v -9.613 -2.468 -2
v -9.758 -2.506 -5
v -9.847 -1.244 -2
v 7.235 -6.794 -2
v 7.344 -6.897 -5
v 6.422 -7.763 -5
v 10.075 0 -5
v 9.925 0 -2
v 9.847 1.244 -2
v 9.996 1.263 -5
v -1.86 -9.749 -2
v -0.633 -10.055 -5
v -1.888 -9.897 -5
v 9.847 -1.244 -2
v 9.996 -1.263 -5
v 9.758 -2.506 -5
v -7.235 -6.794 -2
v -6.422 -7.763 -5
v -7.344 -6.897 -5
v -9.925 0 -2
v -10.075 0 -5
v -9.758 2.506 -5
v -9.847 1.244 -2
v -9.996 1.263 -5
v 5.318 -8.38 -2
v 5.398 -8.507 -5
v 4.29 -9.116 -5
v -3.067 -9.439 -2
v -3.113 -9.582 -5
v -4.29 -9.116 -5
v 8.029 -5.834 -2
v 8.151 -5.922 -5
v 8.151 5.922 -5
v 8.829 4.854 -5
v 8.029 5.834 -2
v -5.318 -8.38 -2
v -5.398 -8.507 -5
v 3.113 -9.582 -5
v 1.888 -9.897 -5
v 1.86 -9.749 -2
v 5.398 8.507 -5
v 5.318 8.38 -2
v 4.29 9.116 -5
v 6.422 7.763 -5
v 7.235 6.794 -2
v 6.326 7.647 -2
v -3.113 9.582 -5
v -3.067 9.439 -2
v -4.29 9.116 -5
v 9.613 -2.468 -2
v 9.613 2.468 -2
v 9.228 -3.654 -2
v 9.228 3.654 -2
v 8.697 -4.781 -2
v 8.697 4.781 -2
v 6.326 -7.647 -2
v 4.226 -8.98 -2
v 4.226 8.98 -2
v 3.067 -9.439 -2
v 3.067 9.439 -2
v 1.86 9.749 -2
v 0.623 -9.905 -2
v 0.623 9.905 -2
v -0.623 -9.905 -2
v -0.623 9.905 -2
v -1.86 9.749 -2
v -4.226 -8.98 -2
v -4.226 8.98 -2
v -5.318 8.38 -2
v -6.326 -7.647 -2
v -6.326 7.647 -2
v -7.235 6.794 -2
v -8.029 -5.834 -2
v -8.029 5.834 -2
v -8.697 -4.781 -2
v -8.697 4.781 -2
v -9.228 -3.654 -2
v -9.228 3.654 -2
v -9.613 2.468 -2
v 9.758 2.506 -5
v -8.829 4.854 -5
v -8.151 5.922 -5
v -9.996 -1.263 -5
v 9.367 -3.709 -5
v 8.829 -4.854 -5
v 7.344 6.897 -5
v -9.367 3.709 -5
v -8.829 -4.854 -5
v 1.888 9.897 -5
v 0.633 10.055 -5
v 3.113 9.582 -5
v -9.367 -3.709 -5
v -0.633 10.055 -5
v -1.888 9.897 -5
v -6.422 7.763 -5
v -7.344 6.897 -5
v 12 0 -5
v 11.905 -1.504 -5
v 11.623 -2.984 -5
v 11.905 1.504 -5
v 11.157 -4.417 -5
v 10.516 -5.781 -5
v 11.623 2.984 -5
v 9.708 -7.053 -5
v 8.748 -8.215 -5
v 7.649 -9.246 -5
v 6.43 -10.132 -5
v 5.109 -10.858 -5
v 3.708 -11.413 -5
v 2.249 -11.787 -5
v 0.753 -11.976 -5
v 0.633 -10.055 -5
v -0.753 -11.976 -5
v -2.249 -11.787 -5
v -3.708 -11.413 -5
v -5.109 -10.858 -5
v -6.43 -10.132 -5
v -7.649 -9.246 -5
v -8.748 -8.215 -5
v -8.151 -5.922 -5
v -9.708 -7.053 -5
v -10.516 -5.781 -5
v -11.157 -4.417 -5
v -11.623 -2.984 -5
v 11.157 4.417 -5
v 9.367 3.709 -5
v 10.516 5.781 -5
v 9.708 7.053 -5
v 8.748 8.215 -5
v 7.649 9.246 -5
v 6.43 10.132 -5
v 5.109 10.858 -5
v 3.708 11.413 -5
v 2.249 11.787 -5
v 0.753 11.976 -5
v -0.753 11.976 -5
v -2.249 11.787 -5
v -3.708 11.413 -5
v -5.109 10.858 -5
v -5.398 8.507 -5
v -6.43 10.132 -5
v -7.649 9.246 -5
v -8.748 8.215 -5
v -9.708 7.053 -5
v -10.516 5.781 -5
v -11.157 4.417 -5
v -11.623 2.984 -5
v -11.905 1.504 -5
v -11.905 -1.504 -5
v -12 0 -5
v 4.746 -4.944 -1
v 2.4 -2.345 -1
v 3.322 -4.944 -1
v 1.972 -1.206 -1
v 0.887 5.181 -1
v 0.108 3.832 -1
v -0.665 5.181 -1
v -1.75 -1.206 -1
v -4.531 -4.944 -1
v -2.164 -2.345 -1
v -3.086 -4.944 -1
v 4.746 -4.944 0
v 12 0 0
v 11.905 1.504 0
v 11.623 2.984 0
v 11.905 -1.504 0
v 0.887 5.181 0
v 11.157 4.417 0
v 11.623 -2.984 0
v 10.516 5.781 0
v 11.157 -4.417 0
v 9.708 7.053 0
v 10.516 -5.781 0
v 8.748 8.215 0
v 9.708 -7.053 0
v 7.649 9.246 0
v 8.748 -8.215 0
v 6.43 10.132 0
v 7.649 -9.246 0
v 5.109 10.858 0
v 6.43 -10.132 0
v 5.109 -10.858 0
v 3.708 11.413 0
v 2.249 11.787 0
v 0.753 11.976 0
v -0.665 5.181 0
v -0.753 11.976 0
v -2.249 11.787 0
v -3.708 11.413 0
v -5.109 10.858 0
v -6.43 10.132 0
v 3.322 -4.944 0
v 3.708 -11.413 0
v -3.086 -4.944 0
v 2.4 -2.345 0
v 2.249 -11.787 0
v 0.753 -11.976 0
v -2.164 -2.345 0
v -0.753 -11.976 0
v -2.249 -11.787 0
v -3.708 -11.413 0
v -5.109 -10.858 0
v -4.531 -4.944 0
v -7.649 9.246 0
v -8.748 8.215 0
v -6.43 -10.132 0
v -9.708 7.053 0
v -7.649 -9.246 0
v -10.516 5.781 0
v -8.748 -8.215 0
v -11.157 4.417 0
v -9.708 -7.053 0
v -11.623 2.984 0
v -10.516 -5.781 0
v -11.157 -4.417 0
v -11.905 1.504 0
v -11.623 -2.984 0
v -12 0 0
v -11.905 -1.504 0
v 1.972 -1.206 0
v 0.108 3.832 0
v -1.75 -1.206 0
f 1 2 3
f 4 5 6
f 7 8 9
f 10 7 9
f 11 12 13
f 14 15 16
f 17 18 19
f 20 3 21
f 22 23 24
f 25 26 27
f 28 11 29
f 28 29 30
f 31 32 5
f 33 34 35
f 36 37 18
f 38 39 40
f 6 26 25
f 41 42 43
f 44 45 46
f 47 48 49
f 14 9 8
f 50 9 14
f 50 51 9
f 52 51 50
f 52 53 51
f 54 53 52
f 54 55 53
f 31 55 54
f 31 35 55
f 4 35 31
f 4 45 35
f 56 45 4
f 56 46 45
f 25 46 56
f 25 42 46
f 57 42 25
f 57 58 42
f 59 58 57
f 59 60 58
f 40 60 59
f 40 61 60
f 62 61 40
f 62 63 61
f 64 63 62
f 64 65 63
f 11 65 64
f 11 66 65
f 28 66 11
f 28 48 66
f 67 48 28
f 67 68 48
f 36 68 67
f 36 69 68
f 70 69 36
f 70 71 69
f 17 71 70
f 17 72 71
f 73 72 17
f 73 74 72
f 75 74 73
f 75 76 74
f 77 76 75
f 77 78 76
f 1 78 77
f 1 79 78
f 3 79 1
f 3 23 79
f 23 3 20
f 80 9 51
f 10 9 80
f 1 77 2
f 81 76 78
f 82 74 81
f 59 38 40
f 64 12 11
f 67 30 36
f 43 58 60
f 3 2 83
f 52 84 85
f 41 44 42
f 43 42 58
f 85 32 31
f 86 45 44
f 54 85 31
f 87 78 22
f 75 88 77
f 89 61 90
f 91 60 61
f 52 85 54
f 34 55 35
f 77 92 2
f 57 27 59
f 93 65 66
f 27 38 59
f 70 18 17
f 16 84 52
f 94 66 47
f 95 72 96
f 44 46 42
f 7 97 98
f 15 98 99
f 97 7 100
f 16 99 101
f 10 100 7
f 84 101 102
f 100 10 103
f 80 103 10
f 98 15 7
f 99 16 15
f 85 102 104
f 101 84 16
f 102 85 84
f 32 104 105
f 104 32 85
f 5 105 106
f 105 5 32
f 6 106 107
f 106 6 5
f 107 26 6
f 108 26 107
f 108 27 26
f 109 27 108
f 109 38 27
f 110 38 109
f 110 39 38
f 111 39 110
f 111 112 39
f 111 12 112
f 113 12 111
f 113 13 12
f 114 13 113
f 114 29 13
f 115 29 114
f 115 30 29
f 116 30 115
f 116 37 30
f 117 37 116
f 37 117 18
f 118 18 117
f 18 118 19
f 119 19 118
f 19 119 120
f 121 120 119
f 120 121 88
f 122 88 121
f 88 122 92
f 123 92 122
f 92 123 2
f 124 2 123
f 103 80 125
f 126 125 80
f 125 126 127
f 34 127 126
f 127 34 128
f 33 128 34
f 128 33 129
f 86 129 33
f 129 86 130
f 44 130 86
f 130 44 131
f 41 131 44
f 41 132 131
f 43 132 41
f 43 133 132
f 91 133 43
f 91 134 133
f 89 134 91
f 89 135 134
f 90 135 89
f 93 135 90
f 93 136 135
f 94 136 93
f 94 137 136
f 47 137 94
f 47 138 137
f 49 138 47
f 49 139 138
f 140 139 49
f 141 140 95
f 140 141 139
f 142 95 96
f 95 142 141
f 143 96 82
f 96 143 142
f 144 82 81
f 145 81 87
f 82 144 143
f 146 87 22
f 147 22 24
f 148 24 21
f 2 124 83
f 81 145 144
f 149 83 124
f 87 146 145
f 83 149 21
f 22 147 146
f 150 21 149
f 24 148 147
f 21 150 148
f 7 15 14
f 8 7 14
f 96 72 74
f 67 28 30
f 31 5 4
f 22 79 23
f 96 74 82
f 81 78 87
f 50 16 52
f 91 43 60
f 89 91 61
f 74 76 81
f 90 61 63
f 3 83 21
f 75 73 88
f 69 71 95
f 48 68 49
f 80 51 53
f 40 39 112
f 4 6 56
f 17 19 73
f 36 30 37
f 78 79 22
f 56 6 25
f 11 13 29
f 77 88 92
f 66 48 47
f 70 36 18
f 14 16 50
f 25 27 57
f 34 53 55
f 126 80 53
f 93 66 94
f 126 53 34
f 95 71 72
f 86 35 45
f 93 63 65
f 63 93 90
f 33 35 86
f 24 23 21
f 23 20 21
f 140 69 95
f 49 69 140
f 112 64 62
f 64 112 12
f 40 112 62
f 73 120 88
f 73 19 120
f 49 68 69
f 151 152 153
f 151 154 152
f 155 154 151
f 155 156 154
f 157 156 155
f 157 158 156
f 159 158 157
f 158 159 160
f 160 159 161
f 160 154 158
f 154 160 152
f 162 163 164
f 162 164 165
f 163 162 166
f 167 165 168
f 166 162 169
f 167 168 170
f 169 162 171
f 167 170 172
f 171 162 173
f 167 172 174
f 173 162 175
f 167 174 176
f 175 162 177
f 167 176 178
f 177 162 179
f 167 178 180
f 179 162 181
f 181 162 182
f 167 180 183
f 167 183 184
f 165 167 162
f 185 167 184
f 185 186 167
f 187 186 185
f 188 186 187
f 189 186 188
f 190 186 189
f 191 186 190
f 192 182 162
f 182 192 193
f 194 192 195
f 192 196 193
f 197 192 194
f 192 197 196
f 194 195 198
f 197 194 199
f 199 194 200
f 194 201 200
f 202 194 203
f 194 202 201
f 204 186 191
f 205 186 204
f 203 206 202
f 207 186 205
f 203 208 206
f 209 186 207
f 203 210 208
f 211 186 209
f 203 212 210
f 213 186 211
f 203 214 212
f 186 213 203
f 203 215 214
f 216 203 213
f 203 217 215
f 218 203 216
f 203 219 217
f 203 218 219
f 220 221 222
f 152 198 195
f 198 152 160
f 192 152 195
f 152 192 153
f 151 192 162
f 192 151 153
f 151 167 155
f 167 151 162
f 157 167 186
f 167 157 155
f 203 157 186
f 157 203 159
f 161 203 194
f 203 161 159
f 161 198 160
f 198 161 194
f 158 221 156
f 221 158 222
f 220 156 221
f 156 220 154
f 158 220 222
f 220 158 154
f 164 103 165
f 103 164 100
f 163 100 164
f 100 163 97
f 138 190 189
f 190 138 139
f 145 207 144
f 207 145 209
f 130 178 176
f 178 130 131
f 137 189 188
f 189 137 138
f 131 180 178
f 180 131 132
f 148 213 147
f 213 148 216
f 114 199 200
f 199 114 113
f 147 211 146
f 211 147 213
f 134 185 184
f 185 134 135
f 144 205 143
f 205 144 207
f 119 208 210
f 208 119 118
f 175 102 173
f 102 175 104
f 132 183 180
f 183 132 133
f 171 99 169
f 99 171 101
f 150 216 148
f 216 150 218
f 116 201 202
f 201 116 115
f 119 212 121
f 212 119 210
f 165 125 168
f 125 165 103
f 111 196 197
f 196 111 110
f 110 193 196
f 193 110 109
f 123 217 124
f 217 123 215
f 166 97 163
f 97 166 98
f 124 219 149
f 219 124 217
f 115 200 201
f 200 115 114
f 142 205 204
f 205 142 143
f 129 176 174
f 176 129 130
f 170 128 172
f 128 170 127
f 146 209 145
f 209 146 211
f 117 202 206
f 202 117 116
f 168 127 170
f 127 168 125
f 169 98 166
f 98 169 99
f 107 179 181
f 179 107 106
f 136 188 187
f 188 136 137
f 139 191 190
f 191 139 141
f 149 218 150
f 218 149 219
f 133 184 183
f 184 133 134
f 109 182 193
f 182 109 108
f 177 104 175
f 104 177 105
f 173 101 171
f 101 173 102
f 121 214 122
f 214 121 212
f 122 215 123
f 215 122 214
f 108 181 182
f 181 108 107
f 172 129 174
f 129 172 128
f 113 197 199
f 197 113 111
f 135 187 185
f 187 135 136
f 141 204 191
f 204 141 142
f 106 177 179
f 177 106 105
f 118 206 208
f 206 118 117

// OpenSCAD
$fn = 50;

difference() {
	union() {
		translate(v = [0, 0, -5.0]) {
			cylinder(h = 5, r = 12.0);
		}
	}
	union() {
		#translate(v = [0, 0, -5.0]) {
			cylinder(h = 3, r1 = 10.075, r2 = 9.925);
		}
		translate(v = [0, 0, -1]) {
			linear_extrude(height = 1) {
				text(font = "Impact", halign = "center", size = 10, text = "A", valign = "center");
			}
		}
	}
}
